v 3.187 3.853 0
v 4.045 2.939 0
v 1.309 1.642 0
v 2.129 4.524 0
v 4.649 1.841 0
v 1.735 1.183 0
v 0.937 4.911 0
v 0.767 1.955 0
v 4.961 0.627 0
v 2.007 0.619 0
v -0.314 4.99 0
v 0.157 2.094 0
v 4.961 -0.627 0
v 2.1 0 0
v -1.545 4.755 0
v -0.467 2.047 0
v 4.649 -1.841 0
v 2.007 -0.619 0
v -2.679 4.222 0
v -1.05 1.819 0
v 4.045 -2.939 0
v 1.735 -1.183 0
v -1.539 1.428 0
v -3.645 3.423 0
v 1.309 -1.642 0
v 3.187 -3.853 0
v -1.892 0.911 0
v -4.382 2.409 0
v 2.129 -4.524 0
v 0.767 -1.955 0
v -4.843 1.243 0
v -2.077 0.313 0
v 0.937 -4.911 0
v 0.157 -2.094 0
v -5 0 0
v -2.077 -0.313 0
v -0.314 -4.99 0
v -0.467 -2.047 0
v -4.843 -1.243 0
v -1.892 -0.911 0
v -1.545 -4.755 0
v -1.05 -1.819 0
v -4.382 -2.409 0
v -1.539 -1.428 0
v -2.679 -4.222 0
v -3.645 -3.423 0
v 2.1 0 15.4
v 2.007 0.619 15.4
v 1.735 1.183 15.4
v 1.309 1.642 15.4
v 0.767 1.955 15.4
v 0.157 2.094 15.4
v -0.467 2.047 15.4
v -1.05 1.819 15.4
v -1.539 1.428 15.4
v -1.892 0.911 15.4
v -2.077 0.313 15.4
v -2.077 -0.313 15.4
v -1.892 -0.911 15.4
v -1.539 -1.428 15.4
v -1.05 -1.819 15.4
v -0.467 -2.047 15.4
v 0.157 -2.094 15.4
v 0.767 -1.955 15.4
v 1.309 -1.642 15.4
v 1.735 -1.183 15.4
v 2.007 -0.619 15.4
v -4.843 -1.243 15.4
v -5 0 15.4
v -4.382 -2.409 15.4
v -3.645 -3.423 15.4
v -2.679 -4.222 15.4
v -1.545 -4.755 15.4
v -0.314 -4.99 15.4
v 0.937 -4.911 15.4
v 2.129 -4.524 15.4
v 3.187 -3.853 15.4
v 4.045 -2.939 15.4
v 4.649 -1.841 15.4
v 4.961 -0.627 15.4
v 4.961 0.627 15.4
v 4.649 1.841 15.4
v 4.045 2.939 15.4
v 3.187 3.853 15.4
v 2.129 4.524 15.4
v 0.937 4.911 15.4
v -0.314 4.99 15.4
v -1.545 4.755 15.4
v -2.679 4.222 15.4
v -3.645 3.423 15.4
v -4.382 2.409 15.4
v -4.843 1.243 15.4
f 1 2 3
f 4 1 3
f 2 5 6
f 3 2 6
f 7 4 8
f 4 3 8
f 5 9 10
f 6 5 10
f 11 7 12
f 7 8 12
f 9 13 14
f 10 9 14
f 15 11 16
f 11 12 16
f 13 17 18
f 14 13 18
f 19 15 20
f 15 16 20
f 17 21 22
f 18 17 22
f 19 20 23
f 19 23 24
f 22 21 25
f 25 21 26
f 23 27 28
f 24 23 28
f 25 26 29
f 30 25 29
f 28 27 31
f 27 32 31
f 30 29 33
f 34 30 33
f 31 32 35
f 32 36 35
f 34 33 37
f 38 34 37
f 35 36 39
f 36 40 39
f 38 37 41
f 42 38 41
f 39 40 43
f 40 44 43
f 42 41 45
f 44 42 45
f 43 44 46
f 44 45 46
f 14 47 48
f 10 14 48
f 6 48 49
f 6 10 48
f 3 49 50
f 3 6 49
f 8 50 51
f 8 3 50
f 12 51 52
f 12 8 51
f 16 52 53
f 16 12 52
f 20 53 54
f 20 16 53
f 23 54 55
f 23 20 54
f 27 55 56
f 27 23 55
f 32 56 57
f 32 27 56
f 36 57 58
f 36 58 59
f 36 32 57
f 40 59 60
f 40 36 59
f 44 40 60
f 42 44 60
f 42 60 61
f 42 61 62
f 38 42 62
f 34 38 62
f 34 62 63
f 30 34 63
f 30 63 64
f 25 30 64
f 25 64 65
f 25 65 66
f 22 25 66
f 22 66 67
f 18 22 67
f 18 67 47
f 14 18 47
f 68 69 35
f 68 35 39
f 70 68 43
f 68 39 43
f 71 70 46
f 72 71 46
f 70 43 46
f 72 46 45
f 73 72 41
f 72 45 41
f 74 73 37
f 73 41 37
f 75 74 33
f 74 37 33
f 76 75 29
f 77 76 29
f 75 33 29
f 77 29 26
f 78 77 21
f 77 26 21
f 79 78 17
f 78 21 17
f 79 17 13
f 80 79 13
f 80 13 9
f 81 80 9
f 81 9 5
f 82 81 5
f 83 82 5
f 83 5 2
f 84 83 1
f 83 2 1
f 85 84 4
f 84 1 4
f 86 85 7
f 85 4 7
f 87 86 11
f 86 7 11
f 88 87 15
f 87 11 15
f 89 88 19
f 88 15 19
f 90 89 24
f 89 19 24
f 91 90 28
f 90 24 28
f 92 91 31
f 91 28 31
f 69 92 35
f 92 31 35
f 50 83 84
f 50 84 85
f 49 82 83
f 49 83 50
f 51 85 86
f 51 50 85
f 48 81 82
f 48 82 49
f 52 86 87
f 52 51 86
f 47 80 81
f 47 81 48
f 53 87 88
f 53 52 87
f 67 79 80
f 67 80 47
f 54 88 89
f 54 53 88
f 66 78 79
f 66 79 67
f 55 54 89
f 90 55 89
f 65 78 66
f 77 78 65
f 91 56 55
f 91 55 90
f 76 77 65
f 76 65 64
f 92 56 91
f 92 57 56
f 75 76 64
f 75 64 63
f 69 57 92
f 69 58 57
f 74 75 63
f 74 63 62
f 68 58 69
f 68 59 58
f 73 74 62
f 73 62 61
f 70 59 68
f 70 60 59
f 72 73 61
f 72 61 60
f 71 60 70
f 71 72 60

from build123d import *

# Parameters (mm, degrees)
SKETCH_1_R          = 5
EXTRUDE_1_DEPTH     = 15.4
SKETCH_2_R          = 2.1
CUT_EXTRUDE_1_DEPTH = 10


with BuildPart() as part:
    # ｽｹｯﾁ1 → ﾎﾞｽ - 押し出し1 (new body)
    with BuildSketch(Plane.XY):
        with Locations(Location((0, 0, 0), (0, 0, 180))):
            Circle(SKETCH_1_R)
    extrude(amount=EXTRUDE_1_DEPTH)

    # ｽｹｯﾁ2 → ｶｯﾄ - 押し出し1 (cut)
    with BuildSketch(Plane.XY.offset(15.4)):
        Circle(SKETCH_2_R)
    cut_extrude_1 = extrude(amount=-CUT_EXTRUDE_1_DEPTH, mode=Mode.SUBTRACT)

    # ﾐﾗｰ1: ｶｯﾄ - 押し出し1 across plane
    add(cut_extrude_1.mirror(Plane.XY.offset(7.7)), mode=Mode.SUBTRACT)


solid = part.part
